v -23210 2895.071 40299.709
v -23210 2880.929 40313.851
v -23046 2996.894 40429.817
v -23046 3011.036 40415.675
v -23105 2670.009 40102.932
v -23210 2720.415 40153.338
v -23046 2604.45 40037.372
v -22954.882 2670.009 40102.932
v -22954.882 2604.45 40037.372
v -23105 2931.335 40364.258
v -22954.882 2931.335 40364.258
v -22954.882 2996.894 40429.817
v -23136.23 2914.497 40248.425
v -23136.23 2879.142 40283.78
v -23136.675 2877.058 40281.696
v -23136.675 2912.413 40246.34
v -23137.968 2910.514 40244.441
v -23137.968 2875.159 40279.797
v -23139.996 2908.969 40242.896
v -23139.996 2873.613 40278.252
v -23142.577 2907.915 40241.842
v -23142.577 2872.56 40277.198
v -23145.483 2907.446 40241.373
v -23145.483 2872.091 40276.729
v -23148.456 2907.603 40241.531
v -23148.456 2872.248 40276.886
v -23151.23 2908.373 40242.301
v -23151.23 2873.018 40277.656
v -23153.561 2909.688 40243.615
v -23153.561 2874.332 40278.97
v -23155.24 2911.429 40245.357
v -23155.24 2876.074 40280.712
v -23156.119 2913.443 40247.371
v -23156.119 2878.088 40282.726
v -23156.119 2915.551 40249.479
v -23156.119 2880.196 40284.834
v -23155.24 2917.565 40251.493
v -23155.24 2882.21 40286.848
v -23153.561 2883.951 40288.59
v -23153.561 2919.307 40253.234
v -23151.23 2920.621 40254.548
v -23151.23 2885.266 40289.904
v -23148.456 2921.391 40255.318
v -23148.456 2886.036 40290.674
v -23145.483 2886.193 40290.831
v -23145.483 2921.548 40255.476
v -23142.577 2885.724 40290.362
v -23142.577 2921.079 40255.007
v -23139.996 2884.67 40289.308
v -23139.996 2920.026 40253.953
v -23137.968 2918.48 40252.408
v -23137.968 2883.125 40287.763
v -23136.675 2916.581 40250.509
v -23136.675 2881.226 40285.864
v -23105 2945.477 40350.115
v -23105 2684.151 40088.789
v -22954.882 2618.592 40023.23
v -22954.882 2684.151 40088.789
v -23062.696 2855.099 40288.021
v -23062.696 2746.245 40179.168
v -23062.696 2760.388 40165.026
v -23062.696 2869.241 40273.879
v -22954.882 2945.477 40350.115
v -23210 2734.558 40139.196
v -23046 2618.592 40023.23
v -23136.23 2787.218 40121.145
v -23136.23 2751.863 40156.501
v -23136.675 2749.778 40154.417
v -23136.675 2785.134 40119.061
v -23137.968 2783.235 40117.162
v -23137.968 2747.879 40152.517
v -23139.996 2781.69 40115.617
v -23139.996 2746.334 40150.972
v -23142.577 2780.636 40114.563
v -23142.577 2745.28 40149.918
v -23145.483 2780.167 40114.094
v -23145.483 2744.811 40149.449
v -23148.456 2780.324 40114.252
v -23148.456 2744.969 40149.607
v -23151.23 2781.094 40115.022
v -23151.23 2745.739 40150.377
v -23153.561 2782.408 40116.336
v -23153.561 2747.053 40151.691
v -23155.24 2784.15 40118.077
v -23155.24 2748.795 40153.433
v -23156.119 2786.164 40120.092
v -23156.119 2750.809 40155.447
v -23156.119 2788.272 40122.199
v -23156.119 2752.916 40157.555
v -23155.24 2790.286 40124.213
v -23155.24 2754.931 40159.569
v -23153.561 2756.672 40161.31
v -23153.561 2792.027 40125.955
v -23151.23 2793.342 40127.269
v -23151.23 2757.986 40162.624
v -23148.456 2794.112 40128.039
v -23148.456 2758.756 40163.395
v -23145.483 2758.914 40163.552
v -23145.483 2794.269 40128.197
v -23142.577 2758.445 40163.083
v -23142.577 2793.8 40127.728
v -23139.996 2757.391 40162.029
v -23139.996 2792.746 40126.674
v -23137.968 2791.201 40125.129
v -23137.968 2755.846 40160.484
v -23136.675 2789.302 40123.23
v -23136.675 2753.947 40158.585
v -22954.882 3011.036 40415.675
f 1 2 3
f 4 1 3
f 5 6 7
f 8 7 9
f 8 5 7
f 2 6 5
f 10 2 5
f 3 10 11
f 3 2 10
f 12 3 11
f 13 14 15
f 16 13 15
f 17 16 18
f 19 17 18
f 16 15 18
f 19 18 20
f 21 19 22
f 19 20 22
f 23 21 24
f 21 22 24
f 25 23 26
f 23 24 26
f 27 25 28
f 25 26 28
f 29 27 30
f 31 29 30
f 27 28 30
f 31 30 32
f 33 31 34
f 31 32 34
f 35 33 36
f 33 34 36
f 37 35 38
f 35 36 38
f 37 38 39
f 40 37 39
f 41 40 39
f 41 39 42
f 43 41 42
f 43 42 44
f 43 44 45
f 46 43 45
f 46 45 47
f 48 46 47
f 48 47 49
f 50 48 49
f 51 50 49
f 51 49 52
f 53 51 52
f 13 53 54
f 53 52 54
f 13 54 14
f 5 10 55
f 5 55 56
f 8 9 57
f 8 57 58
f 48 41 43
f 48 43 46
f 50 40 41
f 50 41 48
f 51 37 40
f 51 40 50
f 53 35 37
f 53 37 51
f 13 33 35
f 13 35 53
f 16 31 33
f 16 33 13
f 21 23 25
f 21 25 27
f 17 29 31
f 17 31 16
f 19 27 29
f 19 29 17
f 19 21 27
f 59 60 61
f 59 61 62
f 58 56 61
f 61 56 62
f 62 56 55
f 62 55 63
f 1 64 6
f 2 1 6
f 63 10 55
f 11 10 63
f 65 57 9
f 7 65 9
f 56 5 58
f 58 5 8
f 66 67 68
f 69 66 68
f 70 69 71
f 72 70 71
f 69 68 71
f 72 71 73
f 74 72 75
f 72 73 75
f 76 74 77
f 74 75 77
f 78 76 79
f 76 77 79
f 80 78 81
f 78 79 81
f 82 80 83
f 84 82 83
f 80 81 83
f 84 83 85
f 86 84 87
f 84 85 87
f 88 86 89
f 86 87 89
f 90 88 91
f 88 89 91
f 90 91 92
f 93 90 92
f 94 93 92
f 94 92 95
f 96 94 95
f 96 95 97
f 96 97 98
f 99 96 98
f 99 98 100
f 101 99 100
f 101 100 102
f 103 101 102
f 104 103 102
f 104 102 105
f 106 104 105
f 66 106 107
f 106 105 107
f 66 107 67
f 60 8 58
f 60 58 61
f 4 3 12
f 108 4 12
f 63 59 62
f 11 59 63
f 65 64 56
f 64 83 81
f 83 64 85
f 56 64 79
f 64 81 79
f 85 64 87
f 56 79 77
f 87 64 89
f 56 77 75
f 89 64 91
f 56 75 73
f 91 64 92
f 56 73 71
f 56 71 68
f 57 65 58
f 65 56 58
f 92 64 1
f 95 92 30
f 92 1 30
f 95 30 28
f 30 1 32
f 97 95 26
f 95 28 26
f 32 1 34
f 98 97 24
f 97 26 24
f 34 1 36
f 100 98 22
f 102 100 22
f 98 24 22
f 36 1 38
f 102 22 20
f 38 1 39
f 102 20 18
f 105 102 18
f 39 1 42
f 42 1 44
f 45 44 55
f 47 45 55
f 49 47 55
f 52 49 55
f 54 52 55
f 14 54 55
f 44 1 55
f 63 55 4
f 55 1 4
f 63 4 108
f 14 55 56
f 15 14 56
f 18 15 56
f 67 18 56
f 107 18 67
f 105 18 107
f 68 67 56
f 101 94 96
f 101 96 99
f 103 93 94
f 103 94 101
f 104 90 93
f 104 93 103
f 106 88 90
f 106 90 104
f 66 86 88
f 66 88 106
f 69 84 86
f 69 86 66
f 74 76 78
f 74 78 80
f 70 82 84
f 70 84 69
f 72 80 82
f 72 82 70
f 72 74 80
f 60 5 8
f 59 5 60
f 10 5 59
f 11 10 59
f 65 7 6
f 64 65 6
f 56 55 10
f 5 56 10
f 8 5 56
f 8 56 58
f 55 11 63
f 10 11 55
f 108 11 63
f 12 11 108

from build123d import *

# Parameters (mm, degrees)
BOSS_EXTRUDE1_DEPTH      = 5
BOSS_EXTRUDE1_DEPTH_BACK = 100
BOSS_EXTRUDE1_START      = -23110
SKETCH3_W                = 150.118051911
SKETCH3_H                = 92.714651823
BOSS_EXTRUDE2_DEPTH      = 20
SKETCH4_R                = 10
BOSS_EXTRUDE3_DEPTH      = 50
CUT_EXTRUDE1_DEPTH       = 38501.104645459
BOSS_EXTRUDE4_DEPTH      = 20


with BuildPart() as part:
    # Sketch2 → Boss-Extrude1 (new, two sides: drawn at the far end of the back side and taken through both)
    with BuildSketch(Plane(origin=(0, 0, 0), x_dir=(0, 0, -1), z_dir=(1, 0, 0)).offset(BOSS_EXTRUDE1_START - BOSS_EXTRUDE1_DEPTH_BACK)):
        Polygon((-40429.816686048, 2996.894248022), (-40037.372422489, 2604.449984464), (-40023.230286866, 2618.592120087), (-40415.674550424, 3011.036383646), align=None)
    extrude(amount=BOSS_EXTRUDE1_DEPTH + BOSS_EXTRUDE1_DEPTH_BACK)

    # Sketch3 → Boss-Extrude2 (add)
    with BuildSketch(Plane(origin=(0, -18716.461219013, 18716.461219015), x_dir=(1, 0, 0), z_dir=(0, -0.7071067811865143, 0.7071067811865808))):
        with Locations((-23029.940974045, 30660.964460197)):
            Rectangle(SKETCH3_W, SKETCH3_H)
        with Locations((-23029.940974045, 30198.67911202)):
            Rectangle(SKETCH3_W, SKETCH3_H)
    extrude(amount=-BOSS_EXTRUDE2_DEPTH)

    # Sketch4 → Boss-Extrude3 (add)
    with BuildSketch(Plane(origin=(0, -18702.319083389, 18702.319083389), x_dir=(1, 0, 0), z_dir=(0, 0.7071067811865416, -0.7071067811865535))):
        with Locations((-23146.230449039, -30340.794679614)):
            Circle(SKETCH4_R)
        with Locations((-23146.230449039, -30520.794679614)):
            Circle(SKETCH4_R)
    extrude(amount=BOSS_EXTRUDE3_DEPTH)

    # Sketch7 → Cut-Extrude1 (cut, through all)
    with BuildSketch(Plane(origin=(0, -18716.461219013, 18716.461219015), x_dir=(1, 0, 0), z_dir=(0, -0.7071067811865143, 0.7071067811865808))):
        Polygon((-23210, 30152.321786108), (-23046, 30152.321786108), (-23210, 30316.321786108), align=None)
        Polygon((-23210, 30707.321786108), (-23210, 30543.321786108), (-23046, 30707.321786108), align=None)
    extrude(amount=-CUT_EXTRUDE1_DEPTH, mode=Mode.SUBTRACT)


with BuildPart() as body_2:
    # Sketch7<3> → Boss-Extrude4 (new body)
    with BuildSketch(Plane(origin=(0, -18716.461219013, 18716.461219015), x_dir=(1, 0, 0), z_dir=(0, -0.7071067811865143, 0.7071067811865808))):
        Polygon((-23105, 30245.036437931), (-22954.881948089, 30245.036437931), (-23062.696263559, 30352.850753401), (-23062.696263559, 30506.792818814), (-22954.881948089, 30614.607134285), (-23105, 30614.607134285), align=None)
    extrude(amount=-BOSS_EXTRUDE4_DEPTH)


solid = Compound([part.part, body_2.part])
